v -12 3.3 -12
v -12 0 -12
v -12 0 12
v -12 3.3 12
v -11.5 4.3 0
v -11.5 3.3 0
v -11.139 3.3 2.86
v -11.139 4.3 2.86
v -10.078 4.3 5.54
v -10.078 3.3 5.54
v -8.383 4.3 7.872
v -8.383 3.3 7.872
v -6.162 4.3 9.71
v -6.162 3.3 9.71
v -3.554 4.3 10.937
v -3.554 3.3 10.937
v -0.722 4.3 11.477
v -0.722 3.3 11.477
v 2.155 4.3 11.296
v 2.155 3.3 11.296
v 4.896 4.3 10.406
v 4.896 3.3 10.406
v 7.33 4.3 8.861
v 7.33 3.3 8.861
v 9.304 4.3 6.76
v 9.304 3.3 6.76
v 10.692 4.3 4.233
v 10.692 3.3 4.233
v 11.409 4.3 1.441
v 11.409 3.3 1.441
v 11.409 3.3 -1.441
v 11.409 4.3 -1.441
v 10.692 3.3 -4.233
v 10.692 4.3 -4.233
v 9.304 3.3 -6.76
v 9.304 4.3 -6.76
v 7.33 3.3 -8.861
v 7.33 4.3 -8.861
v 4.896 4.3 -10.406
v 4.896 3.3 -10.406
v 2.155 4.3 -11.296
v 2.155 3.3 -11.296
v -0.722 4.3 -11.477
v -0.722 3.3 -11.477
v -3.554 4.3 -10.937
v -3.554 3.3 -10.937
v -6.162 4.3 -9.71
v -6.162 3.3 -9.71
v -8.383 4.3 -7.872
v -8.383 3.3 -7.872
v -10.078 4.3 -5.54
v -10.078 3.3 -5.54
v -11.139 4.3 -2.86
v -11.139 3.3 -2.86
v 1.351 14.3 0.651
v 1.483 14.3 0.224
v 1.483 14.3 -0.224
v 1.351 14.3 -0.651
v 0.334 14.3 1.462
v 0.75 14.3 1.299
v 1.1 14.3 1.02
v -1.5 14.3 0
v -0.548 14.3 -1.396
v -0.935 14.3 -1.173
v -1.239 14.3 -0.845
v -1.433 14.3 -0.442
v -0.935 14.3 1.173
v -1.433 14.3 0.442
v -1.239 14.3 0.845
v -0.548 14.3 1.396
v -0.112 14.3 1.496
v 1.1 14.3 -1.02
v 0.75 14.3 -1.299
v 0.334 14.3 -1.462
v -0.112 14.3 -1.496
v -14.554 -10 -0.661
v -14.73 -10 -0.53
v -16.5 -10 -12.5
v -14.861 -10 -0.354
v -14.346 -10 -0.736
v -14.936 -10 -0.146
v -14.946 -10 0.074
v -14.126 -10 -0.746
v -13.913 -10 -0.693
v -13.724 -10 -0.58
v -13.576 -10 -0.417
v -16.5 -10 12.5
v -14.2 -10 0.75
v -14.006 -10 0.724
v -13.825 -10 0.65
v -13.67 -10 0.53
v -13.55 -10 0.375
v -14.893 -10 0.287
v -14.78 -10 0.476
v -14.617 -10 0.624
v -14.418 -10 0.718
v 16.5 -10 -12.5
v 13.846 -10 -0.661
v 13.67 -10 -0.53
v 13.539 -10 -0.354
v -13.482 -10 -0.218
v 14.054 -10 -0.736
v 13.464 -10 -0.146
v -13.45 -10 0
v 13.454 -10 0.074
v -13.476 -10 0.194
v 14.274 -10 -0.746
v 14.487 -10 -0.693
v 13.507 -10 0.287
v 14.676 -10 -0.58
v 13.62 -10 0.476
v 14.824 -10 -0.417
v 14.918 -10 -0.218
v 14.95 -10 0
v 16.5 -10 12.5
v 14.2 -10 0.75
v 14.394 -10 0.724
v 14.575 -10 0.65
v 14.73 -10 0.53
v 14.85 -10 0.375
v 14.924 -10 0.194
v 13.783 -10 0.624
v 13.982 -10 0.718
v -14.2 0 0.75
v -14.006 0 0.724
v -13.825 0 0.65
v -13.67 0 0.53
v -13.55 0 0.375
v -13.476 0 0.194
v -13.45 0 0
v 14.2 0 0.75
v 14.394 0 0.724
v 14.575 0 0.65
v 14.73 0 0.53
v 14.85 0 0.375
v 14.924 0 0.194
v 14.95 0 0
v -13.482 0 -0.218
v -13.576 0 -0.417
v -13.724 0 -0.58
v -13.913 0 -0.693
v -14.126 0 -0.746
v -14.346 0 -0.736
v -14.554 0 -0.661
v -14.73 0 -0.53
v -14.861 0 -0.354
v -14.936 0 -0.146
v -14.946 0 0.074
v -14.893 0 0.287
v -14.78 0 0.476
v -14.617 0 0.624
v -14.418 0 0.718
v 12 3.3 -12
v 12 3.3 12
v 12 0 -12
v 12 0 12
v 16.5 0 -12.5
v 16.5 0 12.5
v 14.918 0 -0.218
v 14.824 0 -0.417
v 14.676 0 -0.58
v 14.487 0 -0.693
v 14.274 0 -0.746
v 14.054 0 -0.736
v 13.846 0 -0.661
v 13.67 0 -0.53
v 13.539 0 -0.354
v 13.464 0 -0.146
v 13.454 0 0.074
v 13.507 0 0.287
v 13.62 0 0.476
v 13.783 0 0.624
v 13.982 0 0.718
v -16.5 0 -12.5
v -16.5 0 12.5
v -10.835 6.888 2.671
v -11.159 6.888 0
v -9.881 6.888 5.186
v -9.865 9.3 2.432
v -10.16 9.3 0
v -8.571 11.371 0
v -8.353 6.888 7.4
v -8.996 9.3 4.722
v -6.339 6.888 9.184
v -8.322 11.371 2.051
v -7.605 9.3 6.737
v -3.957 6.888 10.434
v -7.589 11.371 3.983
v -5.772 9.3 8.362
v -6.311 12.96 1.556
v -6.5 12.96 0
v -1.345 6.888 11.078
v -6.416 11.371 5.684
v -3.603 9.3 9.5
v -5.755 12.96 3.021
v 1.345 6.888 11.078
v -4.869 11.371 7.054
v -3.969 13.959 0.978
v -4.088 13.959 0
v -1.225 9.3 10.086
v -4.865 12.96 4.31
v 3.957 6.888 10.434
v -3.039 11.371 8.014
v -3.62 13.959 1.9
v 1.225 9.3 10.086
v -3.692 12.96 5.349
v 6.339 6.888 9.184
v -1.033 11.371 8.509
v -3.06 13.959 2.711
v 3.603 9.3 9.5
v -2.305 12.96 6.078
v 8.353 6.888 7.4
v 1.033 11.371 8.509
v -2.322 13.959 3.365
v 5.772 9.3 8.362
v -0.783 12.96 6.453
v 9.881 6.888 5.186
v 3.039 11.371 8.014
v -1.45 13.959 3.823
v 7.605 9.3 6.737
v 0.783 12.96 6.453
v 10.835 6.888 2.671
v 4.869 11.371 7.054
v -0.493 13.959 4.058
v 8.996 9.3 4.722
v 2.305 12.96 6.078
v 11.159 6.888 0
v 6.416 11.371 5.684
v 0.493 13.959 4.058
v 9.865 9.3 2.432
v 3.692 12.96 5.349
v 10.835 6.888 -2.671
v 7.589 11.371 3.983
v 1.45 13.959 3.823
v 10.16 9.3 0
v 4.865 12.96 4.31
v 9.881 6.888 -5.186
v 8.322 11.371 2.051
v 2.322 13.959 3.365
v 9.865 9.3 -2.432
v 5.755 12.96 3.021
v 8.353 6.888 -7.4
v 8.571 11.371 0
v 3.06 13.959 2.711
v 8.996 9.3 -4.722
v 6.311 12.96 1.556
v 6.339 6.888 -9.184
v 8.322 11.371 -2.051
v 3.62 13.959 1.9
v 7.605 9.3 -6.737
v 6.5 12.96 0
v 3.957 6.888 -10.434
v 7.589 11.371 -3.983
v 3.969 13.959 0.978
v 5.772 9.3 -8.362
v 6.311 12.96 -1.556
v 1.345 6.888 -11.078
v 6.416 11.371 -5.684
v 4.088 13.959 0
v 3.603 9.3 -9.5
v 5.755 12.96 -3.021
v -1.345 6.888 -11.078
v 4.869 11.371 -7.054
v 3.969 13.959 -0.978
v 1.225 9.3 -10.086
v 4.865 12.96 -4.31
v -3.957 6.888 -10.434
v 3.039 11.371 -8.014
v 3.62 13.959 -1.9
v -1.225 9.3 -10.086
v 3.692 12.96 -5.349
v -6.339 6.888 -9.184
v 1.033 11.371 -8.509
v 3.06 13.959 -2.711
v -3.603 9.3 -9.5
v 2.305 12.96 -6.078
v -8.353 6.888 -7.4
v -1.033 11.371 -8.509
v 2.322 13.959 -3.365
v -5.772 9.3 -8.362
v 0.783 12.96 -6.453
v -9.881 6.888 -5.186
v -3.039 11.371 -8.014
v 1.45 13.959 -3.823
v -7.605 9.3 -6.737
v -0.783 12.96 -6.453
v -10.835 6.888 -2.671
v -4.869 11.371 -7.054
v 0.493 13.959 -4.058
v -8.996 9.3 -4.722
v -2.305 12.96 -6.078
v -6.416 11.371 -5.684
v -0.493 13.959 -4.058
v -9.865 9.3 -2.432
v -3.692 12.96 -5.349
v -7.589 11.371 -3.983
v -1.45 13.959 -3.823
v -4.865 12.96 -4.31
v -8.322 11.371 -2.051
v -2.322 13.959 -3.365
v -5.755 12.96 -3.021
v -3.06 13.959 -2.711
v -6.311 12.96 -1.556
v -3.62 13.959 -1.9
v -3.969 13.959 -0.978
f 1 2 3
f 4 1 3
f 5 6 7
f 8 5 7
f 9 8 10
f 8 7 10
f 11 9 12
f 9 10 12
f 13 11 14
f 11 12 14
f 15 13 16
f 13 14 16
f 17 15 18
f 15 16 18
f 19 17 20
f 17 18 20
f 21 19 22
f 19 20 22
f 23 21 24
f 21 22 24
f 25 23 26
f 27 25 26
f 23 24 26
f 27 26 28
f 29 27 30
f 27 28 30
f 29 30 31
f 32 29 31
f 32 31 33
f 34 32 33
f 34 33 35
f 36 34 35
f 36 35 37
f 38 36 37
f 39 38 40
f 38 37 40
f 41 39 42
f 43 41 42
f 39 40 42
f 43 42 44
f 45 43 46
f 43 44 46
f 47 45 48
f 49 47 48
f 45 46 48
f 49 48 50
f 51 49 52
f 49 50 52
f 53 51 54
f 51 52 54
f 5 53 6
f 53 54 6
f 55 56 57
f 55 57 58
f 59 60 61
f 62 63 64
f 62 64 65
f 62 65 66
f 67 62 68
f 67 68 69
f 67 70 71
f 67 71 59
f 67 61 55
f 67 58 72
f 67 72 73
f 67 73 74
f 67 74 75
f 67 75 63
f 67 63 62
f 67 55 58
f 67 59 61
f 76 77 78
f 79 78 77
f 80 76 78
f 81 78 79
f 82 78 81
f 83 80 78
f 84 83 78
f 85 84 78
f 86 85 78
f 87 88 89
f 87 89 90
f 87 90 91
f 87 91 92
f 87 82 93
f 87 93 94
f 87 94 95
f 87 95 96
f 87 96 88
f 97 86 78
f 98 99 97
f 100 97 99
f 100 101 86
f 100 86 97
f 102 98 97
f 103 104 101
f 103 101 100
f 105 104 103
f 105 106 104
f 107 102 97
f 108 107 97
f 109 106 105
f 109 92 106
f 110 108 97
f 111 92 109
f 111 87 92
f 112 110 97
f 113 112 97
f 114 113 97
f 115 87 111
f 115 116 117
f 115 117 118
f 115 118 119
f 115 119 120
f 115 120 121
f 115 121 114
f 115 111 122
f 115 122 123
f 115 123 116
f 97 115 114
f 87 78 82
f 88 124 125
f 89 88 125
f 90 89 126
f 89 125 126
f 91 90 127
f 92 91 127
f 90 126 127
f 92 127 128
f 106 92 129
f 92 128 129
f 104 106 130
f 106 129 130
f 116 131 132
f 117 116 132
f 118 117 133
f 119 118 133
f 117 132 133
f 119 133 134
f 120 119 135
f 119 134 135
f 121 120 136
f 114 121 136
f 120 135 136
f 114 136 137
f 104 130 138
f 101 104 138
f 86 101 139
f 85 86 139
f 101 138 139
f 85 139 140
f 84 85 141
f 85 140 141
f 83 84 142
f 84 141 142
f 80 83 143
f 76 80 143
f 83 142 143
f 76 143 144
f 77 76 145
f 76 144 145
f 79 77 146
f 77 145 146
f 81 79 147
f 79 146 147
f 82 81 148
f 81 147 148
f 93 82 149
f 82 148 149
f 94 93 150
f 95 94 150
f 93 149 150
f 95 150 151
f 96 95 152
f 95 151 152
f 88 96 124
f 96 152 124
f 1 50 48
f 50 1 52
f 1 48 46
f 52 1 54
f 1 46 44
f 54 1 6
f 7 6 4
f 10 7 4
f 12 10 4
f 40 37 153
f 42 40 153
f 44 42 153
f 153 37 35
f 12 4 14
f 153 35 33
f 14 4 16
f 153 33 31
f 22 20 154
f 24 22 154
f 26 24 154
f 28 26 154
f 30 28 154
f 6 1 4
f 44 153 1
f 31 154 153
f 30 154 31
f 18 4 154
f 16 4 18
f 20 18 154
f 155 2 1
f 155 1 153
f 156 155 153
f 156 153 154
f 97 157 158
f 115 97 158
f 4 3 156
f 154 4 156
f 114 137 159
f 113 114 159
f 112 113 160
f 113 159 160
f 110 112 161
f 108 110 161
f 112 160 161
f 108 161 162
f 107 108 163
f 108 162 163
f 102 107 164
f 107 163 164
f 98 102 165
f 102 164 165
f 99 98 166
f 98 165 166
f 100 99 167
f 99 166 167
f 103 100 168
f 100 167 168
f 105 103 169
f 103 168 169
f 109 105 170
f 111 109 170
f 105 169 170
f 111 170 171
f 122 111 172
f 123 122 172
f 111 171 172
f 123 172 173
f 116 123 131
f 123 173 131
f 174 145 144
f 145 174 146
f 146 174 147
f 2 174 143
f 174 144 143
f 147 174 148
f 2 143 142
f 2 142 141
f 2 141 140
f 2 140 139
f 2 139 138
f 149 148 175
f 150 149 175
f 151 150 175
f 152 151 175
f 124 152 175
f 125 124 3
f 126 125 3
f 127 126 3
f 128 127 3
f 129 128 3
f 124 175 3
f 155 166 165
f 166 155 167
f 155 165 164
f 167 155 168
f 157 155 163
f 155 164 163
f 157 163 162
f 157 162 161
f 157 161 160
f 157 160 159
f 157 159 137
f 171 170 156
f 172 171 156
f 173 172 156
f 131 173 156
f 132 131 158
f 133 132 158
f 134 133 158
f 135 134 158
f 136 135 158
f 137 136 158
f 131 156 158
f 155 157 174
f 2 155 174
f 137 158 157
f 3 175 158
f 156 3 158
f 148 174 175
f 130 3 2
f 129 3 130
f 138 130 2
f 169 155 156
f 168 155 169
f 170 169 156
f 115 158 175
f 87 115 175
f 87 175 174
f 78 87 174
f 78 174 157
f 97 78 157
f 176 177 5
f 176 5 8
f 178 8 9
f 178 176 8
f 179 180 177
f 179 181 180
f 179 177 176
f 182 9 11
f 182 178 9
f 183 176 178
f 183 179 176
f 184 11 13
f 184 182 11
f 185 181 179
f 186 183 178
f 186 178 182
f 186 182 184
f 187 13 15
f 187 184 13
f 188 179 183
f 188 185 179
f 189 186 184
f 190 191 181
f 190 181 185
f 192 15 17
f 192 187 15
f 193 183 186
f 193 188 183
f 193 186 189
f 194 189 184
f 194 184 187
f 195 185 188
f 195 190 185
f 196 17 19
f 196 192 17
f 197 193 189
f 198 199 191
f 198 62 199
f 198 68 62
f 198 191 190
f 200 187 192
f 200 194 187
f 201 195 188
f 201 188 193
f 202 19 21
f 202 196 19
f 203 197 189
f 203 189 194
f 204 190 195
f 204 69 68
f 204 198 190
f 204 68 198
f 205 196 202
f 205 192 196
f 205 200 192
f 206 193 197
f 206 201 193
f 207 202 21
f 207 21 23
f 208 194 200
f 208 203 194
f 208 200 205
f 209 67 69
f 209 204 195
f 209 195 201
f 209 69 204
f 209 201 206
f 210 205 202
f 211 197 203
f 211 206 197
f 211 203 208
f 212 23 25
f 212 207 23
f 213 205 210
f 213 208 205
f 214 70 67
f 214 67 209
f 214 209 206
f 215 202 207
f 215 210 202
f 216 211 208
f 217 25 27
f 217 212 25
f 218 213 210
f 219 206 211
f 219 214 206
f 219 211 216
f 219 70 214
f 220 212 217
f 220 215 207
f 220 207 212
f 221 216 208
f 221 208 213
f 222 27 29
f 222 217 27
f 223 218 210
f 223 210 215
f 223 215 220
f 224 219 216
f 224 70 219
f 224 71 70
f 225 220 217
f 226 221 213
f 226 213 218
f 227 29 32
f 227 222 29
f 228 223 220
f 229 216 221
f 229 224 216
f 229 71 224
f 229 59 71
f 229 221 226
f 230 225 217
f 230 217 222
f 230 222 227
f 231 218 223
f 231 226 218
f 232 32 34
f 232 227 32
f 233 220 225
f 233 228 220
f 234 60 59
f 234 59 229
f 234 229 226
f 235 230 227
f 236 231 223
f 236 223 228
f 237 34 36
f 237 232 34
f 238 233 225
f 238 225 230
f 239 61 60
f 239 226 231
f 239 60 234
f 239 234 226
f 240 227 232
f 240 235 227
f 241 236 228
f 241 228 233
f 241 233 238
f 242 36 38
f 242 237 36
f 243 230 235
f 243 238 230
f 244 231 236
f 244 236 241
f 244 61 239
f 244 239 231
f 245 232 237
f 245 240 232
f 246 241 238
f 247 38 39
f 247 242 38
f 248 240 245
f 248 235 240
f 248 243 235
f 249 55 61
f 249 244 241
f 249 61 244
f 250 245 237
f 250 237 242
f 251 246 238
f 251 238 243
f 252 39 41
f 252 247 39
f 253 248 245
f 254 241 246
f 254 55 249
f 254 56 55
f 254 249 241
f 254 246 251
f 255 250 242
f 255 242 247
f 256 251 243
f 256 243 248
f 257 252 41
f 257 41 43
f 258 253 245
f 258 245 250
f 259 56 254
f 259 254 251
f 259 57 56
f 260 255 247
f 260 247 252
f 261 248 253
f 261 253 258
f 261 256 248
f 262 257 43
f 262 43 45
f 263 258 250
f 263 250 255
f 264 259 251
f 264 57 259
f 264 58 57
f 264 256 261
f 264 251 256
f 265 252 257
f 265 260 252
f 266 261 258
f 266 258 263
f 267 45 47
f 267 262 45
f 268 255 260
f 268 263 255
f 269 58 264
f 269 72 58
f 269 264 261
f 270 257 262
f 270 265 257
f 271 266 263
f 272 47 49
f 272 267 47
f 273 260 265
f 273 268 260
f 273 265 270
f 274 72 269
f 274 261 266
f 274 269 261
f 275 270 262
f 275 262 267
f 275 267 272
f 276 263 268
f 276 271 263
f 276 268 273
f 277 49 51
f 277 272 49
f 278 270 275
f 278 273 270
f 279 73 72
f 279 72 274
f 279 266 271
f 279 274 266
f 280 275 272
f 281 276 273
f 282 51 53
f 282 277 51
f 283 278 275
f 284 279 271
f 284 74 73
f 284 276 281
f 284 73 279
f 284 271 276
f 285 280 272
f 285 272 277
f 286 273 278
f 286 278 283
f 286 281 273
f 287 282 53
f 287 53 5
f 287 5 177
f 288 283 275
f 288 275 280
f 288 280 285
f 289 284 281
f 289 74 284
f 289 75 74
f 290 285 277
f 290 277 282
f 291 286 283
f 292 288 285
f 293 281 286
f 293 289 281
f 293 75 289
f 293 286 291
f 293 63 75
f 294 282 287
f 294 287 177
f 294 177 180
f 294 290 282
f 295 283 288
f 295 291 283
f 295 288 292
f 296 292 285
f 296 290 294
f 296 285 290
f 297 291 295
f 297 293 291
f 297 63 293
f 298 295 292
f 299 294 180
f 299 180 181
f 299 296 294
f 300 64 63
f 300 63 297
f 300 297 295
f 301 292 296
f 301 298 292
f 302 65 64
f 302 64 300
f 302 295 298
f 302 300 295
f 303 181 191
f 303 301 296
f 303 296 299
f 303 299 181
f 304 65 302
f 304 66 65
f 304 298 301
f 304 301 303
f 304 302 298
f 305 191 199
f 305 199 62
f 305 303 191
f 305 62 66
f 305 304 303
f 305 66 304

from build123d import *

# Parameters (mm, degrees)
F0_W     = 24
F0_H     = 24
F1_DEPTH = 10
F2_DEPTH = 3.3
F3_R     = 11.5
F4_DEPTH = 11
F5_R     = 10
F6_DEPTH = 10


with BuildPart() as f1:
    # F0 (on Front) → F1 (new body)
    with BuildSketch(Plane.XZ):
        with BuildLine():
            ThreePointArc((14.95, 0), (14.73033, 0.53033), (14.2, 0.75))
            ThreePointArc((14.2, 0.75), (13.66967, -0.53033), (14.95, 0))
        make_face()
        with BuildLine():
            ThreePointArc((-13.45, 0), (-13.66967, 0.53033), (-14.2, 0.75))
            ThreePointArc((-14.2, 0.75), (-14.73033, -0.53033), (-13.45, 0))
        make_face()
        Polygon((-16.5, -12.5), (16.5, -12.5), (16.5, 12.5), (14.2, 12.5), (-14.2, 12.5), (-16.5, 12.5), align=None)
        with BuildLine():
            ThreePointArc((-13.45, 0), (-14.73033, -0.53033), (-14.2, 0.75))
            ThreePointArc((-14.2, 0.75), (-13.66967, 0.53033), (-13.45, 0))
        make_face(mode=Mode.SUBTRACT)
        Rectangle(F0_W, F0_H, mode=Mode.SUBTRACT)
        with BuildLine():
            ThreePointArc((14.95, 0), (13.66967, -0.53033), (14.2, 0.75))
            ThreePointArc((14.2, 0.75), (14.73033, 0.53033), (14.95, 0))
        make_face(mode=Mode.SUBTRACT)
        Rectangle(F0_W, F0_H)
    extrude(amount=F1_DEPTH)

    # F0 (on Front) → F2 (join)
    with BuildSketch(Plane.XZ):
        Rectangle(F0_W, F0_H)
    extrude(amount=-F2_DEPTH)

    # F3 (on face) → F4 (join)
    with BuildSketch(Plane(origin=(0, 3.3, 0), x_dir=(-1, 0, 0), z_dir=(0, 1, 0))):
        Circle(F3_R)
    extrude(amount=F4_DEPTH)

    # F5
    f5_edges = [f1.edges().sort_by_distance(p)[0] for p in [
        (11.5, 14.3, 0),
    ]]
    fillet(f5_edges, radius=F5_R)

    # F0 (on Front) → F6 (cut)
    with BuildSketch(Plane.XZ):
        with BuildLine():
            ThreePointArc((14.95, 0), (14.73033, 0.53033), (14.2, 0.75))
            ThreePointArc((14.2, 0.75), (13.66967, -0.53033), (14.95, 0))
        make_face()
        with BuildLine():
            ThreePointArc((-13.45, 0), (-13.66967, 0.53033), (-14.2, 0.75))
            ThreePointArc((-14.2, 0.75), (-14.73033, -0.53033), (-13.45, 0))
        make_face()
    extrude(amount=F6_DEPTH, mode=Mode.SUBTRACT)


solid = f1.part
